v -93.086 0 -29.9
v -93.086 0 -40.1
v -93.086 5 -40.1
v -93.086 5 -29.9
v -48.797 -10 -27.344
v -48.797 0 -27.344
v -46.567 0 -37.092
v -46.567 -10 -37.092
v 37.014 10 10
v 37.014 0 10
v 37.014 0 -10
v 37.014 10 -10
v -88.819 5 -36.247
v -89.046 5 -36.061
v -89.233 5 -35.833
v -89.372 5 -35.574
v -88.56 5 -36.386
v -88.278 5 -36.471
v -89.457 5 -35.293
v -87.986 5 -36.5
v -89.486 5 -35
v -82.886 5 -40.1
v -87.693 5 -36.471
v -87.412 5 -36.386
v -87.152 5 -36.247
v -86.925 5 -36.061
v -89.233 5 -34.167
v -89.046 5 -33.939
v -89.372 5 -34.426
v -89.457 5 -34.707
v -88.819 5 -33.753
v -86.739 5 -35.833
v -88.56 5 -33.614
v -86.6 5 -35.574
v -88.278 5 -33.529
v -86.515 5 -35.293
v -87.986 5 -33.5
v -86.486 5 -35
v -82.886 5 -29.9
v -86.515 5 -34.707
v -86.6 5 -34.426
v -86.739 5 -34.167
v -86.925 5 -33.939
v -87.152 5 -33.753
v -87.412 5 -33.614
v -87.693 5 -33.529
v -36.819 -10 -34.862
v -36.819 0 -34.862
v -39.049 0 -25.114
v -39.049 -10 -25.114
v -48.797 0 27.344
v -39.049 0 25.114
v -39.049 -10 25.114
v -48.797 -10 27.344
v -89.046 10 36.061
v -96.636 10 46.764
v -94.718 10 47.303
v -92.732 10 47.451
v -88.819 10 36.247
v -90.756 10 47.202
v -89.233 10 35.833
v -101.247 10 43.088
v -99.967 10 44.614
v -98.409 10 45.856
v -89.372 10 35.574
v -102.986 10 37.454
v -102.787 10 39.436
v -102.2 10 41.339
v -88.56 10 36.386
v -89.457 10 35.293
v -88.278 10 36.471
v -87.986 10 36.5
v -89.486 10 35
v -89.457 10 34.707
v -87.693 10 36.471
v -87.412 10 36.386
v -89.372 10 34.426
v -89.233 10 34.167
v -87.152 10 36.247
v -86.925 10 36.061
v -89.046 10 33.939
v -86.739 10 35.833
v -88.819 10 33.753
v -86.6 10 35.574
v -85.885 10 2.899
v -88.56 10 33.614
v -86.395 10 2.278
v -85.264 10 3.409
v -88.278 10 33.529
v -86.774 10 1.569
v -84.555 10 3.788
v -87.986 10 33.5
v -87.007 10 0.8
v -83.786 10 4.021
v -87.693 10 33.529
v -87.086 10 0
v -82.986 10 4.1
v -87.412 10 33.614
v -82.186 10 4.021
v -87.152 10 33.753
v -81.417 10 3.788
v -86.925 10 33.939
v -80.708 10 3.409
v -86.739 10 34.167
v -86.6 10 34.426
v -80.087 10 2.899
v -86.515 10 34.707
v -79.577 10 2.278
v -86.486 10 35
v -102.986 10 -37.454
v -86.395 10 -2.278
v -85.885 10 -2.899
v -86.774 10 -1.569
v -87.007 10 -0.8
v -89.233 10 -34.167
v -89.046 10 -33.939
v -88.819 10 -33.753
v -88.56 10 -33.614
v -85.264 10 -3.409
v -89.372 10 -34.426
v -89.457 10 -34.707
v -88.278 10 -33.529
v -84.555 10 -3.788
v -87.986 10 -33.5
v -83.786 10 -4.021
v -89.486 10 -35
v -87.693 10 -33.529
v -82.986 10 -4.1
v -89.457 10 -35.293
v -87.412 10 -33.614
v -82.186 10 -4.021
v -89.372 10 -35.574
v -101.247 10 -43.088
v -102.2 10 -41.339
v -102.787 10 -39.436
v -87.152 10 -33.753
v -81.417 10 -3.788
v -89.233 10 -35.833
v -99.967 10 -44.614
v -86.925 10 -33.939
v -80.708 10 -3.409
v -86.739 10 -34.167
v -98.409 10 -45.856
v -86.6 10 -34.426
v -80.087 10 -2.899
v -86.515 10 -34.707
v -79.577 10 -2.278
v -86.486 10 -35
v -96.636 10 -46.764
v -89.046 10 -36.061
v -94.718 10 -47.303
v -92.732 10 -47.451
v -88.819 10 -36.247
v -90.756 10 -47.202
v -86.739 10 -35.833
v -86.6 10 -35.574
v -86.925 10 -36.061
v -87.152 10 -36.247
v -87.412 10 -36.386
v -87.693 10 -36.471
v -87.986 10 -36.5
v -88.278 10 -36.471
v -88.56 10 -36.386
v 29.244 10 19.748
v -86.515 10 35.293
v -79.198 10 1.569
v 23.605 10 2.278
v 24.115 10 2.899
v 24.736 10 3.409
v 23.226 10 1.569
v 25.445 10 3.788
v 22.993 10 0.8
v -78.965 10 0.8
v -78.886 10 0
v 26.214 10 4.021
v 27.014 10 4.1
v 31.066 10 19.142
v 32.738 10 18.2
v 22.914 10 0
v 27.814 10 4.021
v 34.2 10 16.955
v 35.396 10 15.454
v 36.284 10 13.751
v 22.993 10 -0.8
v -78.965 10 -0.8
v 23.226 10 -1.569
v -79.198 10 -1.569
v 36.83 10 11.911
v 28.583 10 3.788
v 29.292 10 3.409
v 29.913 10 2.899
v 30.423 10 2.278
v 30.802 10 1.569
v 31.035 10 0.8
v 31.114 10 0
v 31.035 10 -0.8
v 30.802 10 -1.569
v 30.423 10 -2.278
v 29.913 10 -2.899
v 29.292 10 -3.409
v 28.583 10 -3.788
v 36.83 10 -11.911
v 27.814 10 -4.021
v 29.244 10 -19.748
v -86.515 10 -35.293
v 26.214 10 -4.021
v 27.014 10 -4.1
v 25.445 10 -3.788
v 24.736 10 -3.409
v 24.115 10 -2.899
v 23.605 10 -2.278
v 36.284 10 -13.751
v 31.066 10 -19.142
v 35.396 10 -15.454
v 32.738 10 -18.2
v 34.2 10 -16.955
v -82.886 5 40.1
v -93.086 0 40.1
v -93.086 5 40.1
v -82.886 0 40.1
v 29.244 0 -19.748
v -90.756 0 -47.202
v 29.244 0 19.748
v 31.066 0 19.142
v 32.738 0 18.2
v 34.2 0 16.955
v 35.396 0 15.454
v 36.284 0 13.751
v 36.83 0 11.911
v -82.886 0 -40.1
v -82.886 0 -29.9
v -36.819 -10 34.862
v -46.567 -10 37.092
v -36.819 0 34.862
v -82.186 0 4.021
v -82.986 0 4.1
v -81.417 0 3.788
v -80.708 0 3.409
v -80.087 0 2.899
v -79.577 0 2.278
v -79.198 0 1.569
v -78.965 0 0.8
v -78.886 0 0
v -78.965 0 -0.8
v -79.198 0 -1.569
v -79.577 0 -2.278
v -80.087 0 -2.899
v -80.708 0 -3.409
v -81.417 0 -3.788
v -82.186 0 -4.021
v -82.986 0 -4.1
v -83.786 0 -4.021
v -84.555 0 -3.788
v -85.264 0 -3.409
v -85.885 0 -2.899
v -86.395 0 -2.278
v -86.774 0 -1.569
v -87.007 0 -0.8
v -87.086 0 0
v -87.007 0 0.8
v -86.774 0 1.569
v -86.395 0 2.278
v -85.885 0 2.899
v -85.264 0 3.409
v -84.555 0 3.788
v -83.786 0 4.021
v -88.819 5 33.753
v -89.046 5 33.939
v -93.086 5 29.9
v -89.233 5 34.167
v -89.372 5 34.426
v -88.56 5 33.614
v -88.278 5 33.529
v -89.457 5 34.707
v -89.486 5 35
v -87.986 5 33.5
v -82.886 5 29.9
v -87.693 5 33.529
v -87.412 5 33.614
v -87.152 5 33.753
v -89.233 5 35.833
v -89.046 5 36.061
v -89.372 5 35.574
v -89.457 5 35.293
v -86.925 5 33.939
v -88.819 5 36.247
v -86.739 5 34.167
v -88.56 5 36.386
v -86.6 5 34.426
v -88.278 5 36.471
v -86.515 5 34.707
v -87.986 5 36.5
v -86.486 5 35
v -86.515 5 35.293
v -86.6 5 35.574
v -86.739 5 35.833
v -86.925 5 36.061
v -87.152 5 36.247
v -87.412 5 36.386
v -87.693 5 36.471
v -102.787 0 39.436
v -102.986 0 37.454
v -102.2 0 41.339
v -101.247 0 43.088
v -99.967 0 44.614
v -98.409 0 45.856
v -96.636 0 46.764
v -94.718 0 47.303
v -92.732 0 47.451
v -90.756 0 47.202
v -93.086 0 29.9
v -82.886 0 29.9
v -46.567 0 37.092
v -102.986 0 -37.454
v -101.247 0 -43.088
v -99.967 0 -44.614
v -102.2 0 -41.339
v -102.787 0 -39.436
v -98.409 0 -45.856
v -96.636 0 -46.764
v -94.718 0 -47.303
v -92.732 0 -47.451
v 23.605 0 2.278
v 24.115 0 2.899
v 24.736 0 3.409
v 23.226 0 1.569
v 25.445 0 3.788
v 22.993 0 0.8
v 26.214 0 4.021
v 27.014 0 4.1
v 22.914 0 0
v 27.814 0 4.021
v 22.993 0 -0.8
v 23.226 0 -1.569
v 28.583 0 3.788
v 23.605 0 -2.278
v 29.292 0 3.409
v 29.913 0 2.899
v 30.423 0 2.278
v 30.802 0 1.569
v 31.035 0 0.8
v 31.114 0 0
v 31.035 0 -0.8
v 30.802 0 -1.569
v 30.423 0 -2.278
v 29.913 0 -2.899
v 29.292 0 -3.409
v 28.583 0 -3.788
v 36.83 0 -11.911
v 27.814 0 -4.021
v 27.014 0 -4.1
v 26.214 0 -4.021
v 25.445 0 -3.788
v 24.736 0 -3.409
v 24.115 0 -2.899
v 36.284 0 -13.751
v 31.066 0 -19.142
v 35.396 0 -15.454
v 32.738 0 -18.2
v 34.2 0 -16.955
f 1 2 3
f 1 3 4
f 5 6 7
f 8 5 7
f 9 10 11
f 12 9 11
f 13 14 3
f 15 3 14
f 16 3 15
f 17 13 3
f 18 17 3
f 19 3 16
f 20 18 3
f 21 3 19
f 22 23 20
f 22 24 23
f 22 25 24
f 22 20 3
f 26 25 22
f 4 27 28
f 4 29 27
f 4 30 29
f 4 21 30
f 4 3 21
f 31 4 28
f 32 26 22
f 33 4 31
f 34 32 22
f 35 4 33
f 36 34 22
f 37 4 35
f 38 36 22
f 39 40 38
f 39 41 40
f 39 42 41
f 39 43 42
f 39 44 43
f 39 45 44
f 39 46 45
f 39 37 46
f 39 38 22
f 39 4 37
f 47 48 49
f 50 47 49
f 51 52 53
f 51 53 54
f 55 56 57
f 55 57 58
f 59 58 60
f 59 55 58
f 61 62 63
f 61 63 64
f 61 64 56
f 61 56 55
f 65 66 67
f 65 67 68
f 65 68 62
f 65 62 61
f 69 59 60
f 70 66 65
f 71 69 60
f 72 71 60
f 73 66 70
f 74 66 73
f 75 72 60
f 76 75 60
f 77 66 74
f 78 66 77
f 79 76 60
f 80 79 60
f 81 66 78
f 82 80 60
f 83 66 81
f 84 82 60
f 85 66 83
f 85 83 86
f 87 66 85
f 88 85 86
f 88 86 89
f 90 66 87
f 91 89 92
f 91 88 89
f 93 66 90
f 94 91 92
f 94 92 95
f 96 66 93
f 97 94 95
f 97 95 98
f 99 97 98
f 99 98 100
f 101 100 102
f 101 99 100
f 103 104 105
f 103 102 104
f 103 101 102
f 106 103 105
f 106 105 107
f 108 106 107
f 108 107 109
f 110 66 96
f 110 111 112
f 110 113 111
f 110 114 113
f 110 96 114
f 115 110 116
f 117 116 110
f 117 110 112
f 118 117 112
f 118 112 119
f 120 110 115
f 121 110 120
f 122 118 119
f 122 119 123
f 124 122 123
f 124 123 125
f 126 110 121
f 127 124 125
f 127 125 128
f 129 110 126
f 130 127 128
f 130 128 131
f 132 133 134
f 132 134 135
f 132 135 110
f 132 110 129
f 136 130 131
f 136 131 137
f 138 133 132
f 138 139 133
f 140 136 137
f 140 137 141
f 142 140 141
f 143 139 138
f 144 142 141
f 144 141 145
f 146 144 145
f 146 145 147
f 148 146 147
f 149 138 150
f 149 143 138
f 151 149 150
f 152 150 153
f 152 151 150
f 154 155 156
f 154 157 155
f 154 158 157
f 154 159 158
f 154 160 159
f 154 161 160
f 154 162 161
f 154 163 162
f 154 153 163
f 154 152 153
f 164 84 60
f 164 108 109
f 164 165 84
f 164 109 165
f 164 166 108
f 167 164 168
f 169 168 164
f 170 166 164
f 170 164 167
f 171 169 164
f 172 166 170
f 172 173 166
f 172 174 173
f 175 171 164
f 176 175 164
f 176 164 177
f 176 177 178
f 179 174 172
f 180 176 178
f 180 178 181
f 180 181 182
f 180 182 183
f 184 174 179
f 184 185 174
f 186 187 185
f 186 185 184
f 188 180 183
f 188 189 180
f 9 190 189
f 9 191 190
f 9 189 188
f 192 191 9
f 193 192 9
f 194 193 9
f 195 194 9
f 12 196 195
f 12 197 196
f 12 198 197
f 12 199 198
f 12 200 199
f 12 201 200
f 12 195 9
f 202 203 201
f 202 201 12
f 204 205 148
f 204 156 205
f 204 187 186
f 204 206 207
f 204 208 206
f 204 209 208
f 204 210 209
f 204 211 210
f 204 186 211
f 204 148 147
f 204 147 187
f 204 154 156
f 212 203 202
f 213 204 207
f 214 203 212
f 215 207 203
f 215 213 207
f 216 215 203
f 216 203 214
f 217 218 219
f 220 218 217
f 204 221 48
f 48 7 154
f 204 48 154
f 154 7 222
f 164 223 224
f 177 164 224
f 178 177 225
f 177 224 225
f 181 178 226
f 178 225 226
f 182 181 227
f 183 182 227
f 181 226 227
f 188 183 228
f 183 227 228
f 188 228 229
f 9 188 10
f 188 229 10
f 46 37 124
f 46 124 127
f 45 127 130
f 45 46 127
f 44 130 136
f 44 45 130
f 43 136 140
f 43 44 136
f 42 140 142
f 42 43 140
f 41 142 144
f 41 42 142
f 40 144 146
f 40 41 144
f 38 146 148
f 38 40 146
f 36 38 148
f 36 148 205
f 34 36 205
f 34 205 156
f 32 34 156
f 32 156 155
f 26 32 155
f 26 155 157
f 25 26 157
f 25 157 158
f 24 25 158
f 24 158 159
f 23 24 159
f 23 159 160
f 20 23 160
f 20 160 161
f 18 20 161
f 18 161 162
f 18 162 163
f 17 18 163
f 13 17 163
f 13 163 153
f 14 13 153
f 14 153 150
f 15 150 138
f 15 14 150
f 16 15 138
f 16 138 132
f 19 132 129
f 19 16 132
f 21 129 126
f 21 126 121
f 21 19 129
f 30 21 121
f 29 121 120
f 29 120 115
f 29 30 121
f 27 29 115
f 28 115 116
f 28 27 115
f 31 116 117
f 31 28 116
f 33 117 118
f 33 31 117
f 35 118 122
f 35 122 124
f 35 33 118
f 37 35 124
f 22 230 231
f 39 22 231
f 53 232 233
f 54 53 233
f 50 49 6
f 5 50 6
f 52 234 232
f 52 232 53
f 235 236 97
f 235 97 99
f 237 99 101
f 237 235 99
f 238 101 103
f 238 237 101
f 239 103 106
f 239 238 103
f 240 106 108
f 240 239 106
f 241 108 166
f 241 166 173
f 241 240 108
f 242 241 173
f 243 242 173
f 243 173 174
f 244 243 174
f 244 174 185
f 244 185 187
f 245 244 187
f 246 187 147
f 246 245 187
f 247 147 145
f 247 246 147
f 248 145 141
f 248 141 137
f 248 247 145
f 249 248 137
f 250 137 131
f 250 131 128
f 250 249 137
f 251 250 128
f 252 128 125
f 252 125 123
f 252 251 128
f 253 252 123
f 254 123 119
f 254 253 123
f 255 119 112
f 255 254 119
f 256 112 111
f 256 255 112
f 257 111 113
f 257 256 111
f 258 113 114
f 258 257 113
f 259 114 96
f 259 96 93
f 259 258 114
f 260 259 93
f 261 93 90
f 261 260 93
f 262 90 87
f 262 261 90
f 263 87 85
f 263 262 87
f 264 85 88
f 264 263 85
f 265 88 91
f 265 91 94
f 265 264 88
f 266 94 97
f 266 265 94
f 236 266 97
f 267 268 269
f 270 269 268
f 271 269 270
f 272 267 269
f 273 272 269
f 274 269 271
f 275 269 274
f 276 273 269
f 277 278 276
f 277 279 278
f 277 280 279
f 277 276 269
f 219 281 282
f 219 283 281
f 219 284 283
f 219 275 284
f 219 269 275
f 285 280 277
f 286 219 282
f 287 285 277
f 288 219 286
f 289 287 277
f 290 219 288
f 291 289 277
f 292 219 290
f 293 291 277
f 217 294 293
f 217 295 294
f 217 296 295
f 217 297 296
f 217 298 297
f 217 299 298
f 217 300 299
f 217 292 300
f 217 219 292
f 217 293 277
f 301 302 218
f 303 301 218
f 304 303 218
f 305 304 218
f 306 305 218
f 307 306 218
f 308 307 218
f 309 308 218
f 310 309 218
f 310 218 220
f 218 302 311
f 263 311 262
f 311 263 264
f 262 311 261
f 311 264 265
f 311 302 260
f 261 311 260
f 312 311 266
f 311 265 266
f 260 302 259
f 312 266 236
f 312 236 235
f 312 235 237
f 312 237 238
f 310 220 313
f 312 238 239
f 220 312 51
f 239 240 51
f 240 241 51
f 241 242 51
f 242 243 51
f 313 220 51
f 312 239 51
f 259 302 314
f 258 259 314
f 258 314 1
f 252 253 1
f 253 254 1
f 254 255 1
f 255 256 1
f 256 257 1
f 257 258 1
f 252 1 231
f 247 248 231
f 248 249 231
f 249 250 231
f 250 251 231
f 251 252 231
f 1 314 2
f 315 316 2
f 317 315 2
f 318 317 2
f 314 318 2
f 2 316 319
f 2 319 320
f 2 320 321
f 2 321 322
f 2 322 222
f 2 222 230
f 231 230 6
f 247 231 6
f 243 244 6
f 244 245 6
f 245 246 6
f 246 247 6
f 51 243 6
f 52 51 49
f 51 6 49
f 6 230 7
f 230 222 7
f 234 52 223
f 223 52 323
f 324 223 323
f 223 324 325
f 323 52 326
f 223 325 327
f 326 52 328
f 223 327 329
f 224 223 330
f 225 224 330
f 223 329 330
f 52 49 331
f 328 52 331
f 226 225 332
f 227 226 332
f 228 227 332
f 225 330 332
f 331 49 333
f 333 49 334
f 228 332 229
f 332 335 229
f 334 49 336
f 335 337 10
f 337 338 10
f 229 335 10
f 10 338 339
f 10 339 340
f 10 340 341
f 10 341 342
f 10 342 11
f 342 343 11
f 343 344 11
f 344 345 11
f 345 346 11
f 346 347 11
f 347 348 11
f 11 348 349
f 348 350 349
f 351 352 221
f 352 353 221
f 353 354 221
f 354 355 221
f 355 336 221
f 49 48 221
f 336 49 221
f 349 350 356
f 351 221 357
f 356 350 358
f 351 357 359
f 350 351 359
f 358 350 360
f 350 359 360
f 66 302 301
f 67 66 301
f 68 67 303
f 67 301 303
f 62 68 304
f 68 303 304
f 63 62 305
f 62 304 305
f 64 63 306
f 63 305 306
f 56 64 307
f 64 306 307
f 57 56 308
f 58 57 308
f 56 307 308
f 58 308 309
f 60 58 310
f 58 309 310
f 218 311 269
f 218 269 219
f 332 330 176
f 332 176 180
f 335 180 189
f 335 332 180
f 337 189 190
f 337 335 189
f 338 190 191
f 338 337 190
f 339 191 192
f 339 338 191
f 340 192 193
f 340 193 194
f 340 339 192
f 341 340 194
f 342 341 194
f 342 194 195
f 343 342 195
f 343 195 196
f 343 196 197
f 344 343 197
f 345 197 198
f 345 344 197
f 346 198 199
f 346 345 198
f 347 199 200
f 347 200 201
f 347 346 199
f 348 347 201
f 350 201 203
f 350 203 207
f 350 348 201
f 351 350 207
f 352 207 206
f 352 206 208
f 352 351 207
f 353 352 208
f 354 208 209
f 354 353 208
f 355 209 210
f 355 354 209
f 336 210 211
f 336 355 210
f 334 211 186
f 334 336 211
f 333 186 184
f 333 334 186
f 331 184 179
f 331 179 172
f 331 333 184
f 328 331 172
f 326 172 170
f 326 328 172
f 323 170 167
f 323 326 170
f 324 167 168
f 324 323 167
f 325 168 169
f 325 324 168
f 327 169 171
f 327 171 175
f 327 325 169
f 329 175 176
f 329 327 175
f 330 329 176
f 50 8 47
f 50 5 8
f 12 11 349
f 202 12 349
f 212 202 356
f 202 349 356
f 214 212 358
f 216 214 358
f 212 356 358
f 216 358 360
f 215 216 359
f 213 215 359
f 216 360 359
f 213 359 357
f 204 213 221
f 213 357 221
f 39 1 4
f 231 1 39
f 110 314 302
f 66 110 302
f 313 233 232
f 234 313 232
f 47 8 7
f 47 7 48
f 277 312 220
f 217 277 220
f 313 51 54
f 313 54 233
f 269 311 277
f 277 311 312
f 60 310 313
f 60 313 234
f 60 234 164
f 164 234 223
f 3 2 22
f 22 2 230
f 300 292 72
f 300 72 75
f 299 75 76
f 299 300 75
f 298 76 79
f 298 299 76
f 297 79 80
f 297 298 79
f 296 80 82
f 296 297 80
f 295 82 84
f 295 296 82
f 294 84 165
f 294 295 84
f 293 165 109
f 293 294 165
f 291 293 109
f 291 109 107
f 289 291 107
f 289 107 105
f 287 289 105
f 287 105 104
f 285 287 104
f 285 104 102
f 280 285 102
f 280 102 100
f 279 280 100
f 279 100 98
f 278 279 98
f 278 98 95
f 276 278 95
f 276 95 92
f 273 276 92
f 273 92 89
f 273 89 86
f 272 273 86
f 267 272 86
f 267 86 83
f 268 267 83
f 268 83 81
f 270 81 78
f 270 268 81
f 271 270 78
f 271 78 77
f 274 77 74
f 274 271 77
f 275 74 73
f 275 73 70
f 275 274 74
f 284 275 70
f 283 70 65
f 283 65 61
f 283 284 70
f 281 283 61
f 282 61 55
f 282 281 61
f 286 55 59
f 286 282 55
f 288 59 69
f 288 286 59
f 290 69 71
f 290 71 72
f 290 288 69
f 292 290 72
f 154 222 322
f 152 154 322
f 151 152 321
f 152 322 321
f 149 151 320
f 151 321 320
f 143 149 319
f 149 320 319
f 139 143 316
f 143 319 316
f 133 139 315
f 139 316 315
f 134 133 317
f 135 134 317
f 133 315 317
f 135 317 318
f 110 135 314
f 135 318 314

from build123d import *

# Parameters (mm, degrees)
SKETCH_1_R          = 4.1
SKETCH_1_R_2        = 1.5
EXTRUDE_1_DEPTH     = 10
SKETCH_2_W          = 10.2
SKETCH_2_H          = 10.2
CUT_EXTRUDE_1_DEPTH = 5
EXTRUDE_2_DEPTH     = 10


with BuildPart() as part:
    # ｽｹｯﾁ1 → ﾎﾞｽ - 押し出し1 (new body)
    with BuildSketch(Plane(origin=(0, 0, 0), x_dir=(1, 0, 0), z_dir=(0, 1, 0))):
        with BuildLine():
            Line((-90.755581693, -47.201953746), (29.244418307, -19.748139436))
            ThreePointArc((29.244418307, -19.748139436), (34.834131004, -16.232897902), (37.014221558, -10))
            Line((37.014221558, -10), (37.014221558, 10))
            ThreePointArc((37.014221558, 10), (34.834131004, 16.232897902), (29.244418307, 19.748139436))
            Line((29.244418307, 19.748139436), (-90.755581693, 47.201953746))
            ThreePointArc((-90.755581693, 47.201953746), (-99.218676344, 45.273723756), (-102.985778442, 37.45381431))
            Line((-102.985778442, 37.45381431), (-102.985778442, -37.45381431))
            ThreePointArc((-102.985778442, -37.45381431), (-99.218676344, -45.273723756), (-90.755581693, -47.201953746))
        make_face()
        with Locations(Location((-82.985778442, 0, 0), (0, 0, 270))):
            Circle(SKETCH_1_R, mode=Mode.SUBTRACT)
        with Locations(Location((27.014221558, 0, 0), (0, 0, 270))):
            Circle(SKETCH_1_R, mode=Mode.SUBTRACT)
        with Locations(Location((-87.985778442, 35, 0), (0, 0, 270))):
            Circle(SKETCH_1_R_2, mode=Mode.SUBTRACT)
        with Locations(Location((-87.985778442, -35, 0), (0, 0, 270))):
            Circle(SKETCH_1_R_2, mode=Mode.SUBTRACT)
    extrude(amount=EXTRUDE_1_DEPTH)

    # ｽｹｯﾁ2 → ｶｯﾄ - 押し出し1 (cut)
    with BuildSketch(Plane.XZ):
        with Locations((-87.985778442, 35)):
            Rectangle(SKETCH_2_W, SKETCH_2_H)
        with Locations((-87.985778442, -35)):
            Rectangle(SKETCH_2_W, SKETCH_2_H)
    extrude(amount=-CUT_EXTRUDE_1_DEPTH, mode=Mode.SUBTRACT)

    # ｽｹｯﾁ3 → ﾎﾞｽ - 押し出し2 (add)
    with BuildSketch(Plane.XZ):
        Polygon((-46.56667029, 37.092335677), (-36.818530855, 34.862138928), (-39.048727604, 25.113999492), (-48.79686704, 27.344196242), align=None)
        Polygon((-46.56667029, -37.092335677), (-36.818530855, -34.862138928), (-39.048727604, -25.113999492), (-48.79686704, -27.344196242), align=None)
    extrude(amount=EXTRUDE_2_DEPTH)


solid = part.part
